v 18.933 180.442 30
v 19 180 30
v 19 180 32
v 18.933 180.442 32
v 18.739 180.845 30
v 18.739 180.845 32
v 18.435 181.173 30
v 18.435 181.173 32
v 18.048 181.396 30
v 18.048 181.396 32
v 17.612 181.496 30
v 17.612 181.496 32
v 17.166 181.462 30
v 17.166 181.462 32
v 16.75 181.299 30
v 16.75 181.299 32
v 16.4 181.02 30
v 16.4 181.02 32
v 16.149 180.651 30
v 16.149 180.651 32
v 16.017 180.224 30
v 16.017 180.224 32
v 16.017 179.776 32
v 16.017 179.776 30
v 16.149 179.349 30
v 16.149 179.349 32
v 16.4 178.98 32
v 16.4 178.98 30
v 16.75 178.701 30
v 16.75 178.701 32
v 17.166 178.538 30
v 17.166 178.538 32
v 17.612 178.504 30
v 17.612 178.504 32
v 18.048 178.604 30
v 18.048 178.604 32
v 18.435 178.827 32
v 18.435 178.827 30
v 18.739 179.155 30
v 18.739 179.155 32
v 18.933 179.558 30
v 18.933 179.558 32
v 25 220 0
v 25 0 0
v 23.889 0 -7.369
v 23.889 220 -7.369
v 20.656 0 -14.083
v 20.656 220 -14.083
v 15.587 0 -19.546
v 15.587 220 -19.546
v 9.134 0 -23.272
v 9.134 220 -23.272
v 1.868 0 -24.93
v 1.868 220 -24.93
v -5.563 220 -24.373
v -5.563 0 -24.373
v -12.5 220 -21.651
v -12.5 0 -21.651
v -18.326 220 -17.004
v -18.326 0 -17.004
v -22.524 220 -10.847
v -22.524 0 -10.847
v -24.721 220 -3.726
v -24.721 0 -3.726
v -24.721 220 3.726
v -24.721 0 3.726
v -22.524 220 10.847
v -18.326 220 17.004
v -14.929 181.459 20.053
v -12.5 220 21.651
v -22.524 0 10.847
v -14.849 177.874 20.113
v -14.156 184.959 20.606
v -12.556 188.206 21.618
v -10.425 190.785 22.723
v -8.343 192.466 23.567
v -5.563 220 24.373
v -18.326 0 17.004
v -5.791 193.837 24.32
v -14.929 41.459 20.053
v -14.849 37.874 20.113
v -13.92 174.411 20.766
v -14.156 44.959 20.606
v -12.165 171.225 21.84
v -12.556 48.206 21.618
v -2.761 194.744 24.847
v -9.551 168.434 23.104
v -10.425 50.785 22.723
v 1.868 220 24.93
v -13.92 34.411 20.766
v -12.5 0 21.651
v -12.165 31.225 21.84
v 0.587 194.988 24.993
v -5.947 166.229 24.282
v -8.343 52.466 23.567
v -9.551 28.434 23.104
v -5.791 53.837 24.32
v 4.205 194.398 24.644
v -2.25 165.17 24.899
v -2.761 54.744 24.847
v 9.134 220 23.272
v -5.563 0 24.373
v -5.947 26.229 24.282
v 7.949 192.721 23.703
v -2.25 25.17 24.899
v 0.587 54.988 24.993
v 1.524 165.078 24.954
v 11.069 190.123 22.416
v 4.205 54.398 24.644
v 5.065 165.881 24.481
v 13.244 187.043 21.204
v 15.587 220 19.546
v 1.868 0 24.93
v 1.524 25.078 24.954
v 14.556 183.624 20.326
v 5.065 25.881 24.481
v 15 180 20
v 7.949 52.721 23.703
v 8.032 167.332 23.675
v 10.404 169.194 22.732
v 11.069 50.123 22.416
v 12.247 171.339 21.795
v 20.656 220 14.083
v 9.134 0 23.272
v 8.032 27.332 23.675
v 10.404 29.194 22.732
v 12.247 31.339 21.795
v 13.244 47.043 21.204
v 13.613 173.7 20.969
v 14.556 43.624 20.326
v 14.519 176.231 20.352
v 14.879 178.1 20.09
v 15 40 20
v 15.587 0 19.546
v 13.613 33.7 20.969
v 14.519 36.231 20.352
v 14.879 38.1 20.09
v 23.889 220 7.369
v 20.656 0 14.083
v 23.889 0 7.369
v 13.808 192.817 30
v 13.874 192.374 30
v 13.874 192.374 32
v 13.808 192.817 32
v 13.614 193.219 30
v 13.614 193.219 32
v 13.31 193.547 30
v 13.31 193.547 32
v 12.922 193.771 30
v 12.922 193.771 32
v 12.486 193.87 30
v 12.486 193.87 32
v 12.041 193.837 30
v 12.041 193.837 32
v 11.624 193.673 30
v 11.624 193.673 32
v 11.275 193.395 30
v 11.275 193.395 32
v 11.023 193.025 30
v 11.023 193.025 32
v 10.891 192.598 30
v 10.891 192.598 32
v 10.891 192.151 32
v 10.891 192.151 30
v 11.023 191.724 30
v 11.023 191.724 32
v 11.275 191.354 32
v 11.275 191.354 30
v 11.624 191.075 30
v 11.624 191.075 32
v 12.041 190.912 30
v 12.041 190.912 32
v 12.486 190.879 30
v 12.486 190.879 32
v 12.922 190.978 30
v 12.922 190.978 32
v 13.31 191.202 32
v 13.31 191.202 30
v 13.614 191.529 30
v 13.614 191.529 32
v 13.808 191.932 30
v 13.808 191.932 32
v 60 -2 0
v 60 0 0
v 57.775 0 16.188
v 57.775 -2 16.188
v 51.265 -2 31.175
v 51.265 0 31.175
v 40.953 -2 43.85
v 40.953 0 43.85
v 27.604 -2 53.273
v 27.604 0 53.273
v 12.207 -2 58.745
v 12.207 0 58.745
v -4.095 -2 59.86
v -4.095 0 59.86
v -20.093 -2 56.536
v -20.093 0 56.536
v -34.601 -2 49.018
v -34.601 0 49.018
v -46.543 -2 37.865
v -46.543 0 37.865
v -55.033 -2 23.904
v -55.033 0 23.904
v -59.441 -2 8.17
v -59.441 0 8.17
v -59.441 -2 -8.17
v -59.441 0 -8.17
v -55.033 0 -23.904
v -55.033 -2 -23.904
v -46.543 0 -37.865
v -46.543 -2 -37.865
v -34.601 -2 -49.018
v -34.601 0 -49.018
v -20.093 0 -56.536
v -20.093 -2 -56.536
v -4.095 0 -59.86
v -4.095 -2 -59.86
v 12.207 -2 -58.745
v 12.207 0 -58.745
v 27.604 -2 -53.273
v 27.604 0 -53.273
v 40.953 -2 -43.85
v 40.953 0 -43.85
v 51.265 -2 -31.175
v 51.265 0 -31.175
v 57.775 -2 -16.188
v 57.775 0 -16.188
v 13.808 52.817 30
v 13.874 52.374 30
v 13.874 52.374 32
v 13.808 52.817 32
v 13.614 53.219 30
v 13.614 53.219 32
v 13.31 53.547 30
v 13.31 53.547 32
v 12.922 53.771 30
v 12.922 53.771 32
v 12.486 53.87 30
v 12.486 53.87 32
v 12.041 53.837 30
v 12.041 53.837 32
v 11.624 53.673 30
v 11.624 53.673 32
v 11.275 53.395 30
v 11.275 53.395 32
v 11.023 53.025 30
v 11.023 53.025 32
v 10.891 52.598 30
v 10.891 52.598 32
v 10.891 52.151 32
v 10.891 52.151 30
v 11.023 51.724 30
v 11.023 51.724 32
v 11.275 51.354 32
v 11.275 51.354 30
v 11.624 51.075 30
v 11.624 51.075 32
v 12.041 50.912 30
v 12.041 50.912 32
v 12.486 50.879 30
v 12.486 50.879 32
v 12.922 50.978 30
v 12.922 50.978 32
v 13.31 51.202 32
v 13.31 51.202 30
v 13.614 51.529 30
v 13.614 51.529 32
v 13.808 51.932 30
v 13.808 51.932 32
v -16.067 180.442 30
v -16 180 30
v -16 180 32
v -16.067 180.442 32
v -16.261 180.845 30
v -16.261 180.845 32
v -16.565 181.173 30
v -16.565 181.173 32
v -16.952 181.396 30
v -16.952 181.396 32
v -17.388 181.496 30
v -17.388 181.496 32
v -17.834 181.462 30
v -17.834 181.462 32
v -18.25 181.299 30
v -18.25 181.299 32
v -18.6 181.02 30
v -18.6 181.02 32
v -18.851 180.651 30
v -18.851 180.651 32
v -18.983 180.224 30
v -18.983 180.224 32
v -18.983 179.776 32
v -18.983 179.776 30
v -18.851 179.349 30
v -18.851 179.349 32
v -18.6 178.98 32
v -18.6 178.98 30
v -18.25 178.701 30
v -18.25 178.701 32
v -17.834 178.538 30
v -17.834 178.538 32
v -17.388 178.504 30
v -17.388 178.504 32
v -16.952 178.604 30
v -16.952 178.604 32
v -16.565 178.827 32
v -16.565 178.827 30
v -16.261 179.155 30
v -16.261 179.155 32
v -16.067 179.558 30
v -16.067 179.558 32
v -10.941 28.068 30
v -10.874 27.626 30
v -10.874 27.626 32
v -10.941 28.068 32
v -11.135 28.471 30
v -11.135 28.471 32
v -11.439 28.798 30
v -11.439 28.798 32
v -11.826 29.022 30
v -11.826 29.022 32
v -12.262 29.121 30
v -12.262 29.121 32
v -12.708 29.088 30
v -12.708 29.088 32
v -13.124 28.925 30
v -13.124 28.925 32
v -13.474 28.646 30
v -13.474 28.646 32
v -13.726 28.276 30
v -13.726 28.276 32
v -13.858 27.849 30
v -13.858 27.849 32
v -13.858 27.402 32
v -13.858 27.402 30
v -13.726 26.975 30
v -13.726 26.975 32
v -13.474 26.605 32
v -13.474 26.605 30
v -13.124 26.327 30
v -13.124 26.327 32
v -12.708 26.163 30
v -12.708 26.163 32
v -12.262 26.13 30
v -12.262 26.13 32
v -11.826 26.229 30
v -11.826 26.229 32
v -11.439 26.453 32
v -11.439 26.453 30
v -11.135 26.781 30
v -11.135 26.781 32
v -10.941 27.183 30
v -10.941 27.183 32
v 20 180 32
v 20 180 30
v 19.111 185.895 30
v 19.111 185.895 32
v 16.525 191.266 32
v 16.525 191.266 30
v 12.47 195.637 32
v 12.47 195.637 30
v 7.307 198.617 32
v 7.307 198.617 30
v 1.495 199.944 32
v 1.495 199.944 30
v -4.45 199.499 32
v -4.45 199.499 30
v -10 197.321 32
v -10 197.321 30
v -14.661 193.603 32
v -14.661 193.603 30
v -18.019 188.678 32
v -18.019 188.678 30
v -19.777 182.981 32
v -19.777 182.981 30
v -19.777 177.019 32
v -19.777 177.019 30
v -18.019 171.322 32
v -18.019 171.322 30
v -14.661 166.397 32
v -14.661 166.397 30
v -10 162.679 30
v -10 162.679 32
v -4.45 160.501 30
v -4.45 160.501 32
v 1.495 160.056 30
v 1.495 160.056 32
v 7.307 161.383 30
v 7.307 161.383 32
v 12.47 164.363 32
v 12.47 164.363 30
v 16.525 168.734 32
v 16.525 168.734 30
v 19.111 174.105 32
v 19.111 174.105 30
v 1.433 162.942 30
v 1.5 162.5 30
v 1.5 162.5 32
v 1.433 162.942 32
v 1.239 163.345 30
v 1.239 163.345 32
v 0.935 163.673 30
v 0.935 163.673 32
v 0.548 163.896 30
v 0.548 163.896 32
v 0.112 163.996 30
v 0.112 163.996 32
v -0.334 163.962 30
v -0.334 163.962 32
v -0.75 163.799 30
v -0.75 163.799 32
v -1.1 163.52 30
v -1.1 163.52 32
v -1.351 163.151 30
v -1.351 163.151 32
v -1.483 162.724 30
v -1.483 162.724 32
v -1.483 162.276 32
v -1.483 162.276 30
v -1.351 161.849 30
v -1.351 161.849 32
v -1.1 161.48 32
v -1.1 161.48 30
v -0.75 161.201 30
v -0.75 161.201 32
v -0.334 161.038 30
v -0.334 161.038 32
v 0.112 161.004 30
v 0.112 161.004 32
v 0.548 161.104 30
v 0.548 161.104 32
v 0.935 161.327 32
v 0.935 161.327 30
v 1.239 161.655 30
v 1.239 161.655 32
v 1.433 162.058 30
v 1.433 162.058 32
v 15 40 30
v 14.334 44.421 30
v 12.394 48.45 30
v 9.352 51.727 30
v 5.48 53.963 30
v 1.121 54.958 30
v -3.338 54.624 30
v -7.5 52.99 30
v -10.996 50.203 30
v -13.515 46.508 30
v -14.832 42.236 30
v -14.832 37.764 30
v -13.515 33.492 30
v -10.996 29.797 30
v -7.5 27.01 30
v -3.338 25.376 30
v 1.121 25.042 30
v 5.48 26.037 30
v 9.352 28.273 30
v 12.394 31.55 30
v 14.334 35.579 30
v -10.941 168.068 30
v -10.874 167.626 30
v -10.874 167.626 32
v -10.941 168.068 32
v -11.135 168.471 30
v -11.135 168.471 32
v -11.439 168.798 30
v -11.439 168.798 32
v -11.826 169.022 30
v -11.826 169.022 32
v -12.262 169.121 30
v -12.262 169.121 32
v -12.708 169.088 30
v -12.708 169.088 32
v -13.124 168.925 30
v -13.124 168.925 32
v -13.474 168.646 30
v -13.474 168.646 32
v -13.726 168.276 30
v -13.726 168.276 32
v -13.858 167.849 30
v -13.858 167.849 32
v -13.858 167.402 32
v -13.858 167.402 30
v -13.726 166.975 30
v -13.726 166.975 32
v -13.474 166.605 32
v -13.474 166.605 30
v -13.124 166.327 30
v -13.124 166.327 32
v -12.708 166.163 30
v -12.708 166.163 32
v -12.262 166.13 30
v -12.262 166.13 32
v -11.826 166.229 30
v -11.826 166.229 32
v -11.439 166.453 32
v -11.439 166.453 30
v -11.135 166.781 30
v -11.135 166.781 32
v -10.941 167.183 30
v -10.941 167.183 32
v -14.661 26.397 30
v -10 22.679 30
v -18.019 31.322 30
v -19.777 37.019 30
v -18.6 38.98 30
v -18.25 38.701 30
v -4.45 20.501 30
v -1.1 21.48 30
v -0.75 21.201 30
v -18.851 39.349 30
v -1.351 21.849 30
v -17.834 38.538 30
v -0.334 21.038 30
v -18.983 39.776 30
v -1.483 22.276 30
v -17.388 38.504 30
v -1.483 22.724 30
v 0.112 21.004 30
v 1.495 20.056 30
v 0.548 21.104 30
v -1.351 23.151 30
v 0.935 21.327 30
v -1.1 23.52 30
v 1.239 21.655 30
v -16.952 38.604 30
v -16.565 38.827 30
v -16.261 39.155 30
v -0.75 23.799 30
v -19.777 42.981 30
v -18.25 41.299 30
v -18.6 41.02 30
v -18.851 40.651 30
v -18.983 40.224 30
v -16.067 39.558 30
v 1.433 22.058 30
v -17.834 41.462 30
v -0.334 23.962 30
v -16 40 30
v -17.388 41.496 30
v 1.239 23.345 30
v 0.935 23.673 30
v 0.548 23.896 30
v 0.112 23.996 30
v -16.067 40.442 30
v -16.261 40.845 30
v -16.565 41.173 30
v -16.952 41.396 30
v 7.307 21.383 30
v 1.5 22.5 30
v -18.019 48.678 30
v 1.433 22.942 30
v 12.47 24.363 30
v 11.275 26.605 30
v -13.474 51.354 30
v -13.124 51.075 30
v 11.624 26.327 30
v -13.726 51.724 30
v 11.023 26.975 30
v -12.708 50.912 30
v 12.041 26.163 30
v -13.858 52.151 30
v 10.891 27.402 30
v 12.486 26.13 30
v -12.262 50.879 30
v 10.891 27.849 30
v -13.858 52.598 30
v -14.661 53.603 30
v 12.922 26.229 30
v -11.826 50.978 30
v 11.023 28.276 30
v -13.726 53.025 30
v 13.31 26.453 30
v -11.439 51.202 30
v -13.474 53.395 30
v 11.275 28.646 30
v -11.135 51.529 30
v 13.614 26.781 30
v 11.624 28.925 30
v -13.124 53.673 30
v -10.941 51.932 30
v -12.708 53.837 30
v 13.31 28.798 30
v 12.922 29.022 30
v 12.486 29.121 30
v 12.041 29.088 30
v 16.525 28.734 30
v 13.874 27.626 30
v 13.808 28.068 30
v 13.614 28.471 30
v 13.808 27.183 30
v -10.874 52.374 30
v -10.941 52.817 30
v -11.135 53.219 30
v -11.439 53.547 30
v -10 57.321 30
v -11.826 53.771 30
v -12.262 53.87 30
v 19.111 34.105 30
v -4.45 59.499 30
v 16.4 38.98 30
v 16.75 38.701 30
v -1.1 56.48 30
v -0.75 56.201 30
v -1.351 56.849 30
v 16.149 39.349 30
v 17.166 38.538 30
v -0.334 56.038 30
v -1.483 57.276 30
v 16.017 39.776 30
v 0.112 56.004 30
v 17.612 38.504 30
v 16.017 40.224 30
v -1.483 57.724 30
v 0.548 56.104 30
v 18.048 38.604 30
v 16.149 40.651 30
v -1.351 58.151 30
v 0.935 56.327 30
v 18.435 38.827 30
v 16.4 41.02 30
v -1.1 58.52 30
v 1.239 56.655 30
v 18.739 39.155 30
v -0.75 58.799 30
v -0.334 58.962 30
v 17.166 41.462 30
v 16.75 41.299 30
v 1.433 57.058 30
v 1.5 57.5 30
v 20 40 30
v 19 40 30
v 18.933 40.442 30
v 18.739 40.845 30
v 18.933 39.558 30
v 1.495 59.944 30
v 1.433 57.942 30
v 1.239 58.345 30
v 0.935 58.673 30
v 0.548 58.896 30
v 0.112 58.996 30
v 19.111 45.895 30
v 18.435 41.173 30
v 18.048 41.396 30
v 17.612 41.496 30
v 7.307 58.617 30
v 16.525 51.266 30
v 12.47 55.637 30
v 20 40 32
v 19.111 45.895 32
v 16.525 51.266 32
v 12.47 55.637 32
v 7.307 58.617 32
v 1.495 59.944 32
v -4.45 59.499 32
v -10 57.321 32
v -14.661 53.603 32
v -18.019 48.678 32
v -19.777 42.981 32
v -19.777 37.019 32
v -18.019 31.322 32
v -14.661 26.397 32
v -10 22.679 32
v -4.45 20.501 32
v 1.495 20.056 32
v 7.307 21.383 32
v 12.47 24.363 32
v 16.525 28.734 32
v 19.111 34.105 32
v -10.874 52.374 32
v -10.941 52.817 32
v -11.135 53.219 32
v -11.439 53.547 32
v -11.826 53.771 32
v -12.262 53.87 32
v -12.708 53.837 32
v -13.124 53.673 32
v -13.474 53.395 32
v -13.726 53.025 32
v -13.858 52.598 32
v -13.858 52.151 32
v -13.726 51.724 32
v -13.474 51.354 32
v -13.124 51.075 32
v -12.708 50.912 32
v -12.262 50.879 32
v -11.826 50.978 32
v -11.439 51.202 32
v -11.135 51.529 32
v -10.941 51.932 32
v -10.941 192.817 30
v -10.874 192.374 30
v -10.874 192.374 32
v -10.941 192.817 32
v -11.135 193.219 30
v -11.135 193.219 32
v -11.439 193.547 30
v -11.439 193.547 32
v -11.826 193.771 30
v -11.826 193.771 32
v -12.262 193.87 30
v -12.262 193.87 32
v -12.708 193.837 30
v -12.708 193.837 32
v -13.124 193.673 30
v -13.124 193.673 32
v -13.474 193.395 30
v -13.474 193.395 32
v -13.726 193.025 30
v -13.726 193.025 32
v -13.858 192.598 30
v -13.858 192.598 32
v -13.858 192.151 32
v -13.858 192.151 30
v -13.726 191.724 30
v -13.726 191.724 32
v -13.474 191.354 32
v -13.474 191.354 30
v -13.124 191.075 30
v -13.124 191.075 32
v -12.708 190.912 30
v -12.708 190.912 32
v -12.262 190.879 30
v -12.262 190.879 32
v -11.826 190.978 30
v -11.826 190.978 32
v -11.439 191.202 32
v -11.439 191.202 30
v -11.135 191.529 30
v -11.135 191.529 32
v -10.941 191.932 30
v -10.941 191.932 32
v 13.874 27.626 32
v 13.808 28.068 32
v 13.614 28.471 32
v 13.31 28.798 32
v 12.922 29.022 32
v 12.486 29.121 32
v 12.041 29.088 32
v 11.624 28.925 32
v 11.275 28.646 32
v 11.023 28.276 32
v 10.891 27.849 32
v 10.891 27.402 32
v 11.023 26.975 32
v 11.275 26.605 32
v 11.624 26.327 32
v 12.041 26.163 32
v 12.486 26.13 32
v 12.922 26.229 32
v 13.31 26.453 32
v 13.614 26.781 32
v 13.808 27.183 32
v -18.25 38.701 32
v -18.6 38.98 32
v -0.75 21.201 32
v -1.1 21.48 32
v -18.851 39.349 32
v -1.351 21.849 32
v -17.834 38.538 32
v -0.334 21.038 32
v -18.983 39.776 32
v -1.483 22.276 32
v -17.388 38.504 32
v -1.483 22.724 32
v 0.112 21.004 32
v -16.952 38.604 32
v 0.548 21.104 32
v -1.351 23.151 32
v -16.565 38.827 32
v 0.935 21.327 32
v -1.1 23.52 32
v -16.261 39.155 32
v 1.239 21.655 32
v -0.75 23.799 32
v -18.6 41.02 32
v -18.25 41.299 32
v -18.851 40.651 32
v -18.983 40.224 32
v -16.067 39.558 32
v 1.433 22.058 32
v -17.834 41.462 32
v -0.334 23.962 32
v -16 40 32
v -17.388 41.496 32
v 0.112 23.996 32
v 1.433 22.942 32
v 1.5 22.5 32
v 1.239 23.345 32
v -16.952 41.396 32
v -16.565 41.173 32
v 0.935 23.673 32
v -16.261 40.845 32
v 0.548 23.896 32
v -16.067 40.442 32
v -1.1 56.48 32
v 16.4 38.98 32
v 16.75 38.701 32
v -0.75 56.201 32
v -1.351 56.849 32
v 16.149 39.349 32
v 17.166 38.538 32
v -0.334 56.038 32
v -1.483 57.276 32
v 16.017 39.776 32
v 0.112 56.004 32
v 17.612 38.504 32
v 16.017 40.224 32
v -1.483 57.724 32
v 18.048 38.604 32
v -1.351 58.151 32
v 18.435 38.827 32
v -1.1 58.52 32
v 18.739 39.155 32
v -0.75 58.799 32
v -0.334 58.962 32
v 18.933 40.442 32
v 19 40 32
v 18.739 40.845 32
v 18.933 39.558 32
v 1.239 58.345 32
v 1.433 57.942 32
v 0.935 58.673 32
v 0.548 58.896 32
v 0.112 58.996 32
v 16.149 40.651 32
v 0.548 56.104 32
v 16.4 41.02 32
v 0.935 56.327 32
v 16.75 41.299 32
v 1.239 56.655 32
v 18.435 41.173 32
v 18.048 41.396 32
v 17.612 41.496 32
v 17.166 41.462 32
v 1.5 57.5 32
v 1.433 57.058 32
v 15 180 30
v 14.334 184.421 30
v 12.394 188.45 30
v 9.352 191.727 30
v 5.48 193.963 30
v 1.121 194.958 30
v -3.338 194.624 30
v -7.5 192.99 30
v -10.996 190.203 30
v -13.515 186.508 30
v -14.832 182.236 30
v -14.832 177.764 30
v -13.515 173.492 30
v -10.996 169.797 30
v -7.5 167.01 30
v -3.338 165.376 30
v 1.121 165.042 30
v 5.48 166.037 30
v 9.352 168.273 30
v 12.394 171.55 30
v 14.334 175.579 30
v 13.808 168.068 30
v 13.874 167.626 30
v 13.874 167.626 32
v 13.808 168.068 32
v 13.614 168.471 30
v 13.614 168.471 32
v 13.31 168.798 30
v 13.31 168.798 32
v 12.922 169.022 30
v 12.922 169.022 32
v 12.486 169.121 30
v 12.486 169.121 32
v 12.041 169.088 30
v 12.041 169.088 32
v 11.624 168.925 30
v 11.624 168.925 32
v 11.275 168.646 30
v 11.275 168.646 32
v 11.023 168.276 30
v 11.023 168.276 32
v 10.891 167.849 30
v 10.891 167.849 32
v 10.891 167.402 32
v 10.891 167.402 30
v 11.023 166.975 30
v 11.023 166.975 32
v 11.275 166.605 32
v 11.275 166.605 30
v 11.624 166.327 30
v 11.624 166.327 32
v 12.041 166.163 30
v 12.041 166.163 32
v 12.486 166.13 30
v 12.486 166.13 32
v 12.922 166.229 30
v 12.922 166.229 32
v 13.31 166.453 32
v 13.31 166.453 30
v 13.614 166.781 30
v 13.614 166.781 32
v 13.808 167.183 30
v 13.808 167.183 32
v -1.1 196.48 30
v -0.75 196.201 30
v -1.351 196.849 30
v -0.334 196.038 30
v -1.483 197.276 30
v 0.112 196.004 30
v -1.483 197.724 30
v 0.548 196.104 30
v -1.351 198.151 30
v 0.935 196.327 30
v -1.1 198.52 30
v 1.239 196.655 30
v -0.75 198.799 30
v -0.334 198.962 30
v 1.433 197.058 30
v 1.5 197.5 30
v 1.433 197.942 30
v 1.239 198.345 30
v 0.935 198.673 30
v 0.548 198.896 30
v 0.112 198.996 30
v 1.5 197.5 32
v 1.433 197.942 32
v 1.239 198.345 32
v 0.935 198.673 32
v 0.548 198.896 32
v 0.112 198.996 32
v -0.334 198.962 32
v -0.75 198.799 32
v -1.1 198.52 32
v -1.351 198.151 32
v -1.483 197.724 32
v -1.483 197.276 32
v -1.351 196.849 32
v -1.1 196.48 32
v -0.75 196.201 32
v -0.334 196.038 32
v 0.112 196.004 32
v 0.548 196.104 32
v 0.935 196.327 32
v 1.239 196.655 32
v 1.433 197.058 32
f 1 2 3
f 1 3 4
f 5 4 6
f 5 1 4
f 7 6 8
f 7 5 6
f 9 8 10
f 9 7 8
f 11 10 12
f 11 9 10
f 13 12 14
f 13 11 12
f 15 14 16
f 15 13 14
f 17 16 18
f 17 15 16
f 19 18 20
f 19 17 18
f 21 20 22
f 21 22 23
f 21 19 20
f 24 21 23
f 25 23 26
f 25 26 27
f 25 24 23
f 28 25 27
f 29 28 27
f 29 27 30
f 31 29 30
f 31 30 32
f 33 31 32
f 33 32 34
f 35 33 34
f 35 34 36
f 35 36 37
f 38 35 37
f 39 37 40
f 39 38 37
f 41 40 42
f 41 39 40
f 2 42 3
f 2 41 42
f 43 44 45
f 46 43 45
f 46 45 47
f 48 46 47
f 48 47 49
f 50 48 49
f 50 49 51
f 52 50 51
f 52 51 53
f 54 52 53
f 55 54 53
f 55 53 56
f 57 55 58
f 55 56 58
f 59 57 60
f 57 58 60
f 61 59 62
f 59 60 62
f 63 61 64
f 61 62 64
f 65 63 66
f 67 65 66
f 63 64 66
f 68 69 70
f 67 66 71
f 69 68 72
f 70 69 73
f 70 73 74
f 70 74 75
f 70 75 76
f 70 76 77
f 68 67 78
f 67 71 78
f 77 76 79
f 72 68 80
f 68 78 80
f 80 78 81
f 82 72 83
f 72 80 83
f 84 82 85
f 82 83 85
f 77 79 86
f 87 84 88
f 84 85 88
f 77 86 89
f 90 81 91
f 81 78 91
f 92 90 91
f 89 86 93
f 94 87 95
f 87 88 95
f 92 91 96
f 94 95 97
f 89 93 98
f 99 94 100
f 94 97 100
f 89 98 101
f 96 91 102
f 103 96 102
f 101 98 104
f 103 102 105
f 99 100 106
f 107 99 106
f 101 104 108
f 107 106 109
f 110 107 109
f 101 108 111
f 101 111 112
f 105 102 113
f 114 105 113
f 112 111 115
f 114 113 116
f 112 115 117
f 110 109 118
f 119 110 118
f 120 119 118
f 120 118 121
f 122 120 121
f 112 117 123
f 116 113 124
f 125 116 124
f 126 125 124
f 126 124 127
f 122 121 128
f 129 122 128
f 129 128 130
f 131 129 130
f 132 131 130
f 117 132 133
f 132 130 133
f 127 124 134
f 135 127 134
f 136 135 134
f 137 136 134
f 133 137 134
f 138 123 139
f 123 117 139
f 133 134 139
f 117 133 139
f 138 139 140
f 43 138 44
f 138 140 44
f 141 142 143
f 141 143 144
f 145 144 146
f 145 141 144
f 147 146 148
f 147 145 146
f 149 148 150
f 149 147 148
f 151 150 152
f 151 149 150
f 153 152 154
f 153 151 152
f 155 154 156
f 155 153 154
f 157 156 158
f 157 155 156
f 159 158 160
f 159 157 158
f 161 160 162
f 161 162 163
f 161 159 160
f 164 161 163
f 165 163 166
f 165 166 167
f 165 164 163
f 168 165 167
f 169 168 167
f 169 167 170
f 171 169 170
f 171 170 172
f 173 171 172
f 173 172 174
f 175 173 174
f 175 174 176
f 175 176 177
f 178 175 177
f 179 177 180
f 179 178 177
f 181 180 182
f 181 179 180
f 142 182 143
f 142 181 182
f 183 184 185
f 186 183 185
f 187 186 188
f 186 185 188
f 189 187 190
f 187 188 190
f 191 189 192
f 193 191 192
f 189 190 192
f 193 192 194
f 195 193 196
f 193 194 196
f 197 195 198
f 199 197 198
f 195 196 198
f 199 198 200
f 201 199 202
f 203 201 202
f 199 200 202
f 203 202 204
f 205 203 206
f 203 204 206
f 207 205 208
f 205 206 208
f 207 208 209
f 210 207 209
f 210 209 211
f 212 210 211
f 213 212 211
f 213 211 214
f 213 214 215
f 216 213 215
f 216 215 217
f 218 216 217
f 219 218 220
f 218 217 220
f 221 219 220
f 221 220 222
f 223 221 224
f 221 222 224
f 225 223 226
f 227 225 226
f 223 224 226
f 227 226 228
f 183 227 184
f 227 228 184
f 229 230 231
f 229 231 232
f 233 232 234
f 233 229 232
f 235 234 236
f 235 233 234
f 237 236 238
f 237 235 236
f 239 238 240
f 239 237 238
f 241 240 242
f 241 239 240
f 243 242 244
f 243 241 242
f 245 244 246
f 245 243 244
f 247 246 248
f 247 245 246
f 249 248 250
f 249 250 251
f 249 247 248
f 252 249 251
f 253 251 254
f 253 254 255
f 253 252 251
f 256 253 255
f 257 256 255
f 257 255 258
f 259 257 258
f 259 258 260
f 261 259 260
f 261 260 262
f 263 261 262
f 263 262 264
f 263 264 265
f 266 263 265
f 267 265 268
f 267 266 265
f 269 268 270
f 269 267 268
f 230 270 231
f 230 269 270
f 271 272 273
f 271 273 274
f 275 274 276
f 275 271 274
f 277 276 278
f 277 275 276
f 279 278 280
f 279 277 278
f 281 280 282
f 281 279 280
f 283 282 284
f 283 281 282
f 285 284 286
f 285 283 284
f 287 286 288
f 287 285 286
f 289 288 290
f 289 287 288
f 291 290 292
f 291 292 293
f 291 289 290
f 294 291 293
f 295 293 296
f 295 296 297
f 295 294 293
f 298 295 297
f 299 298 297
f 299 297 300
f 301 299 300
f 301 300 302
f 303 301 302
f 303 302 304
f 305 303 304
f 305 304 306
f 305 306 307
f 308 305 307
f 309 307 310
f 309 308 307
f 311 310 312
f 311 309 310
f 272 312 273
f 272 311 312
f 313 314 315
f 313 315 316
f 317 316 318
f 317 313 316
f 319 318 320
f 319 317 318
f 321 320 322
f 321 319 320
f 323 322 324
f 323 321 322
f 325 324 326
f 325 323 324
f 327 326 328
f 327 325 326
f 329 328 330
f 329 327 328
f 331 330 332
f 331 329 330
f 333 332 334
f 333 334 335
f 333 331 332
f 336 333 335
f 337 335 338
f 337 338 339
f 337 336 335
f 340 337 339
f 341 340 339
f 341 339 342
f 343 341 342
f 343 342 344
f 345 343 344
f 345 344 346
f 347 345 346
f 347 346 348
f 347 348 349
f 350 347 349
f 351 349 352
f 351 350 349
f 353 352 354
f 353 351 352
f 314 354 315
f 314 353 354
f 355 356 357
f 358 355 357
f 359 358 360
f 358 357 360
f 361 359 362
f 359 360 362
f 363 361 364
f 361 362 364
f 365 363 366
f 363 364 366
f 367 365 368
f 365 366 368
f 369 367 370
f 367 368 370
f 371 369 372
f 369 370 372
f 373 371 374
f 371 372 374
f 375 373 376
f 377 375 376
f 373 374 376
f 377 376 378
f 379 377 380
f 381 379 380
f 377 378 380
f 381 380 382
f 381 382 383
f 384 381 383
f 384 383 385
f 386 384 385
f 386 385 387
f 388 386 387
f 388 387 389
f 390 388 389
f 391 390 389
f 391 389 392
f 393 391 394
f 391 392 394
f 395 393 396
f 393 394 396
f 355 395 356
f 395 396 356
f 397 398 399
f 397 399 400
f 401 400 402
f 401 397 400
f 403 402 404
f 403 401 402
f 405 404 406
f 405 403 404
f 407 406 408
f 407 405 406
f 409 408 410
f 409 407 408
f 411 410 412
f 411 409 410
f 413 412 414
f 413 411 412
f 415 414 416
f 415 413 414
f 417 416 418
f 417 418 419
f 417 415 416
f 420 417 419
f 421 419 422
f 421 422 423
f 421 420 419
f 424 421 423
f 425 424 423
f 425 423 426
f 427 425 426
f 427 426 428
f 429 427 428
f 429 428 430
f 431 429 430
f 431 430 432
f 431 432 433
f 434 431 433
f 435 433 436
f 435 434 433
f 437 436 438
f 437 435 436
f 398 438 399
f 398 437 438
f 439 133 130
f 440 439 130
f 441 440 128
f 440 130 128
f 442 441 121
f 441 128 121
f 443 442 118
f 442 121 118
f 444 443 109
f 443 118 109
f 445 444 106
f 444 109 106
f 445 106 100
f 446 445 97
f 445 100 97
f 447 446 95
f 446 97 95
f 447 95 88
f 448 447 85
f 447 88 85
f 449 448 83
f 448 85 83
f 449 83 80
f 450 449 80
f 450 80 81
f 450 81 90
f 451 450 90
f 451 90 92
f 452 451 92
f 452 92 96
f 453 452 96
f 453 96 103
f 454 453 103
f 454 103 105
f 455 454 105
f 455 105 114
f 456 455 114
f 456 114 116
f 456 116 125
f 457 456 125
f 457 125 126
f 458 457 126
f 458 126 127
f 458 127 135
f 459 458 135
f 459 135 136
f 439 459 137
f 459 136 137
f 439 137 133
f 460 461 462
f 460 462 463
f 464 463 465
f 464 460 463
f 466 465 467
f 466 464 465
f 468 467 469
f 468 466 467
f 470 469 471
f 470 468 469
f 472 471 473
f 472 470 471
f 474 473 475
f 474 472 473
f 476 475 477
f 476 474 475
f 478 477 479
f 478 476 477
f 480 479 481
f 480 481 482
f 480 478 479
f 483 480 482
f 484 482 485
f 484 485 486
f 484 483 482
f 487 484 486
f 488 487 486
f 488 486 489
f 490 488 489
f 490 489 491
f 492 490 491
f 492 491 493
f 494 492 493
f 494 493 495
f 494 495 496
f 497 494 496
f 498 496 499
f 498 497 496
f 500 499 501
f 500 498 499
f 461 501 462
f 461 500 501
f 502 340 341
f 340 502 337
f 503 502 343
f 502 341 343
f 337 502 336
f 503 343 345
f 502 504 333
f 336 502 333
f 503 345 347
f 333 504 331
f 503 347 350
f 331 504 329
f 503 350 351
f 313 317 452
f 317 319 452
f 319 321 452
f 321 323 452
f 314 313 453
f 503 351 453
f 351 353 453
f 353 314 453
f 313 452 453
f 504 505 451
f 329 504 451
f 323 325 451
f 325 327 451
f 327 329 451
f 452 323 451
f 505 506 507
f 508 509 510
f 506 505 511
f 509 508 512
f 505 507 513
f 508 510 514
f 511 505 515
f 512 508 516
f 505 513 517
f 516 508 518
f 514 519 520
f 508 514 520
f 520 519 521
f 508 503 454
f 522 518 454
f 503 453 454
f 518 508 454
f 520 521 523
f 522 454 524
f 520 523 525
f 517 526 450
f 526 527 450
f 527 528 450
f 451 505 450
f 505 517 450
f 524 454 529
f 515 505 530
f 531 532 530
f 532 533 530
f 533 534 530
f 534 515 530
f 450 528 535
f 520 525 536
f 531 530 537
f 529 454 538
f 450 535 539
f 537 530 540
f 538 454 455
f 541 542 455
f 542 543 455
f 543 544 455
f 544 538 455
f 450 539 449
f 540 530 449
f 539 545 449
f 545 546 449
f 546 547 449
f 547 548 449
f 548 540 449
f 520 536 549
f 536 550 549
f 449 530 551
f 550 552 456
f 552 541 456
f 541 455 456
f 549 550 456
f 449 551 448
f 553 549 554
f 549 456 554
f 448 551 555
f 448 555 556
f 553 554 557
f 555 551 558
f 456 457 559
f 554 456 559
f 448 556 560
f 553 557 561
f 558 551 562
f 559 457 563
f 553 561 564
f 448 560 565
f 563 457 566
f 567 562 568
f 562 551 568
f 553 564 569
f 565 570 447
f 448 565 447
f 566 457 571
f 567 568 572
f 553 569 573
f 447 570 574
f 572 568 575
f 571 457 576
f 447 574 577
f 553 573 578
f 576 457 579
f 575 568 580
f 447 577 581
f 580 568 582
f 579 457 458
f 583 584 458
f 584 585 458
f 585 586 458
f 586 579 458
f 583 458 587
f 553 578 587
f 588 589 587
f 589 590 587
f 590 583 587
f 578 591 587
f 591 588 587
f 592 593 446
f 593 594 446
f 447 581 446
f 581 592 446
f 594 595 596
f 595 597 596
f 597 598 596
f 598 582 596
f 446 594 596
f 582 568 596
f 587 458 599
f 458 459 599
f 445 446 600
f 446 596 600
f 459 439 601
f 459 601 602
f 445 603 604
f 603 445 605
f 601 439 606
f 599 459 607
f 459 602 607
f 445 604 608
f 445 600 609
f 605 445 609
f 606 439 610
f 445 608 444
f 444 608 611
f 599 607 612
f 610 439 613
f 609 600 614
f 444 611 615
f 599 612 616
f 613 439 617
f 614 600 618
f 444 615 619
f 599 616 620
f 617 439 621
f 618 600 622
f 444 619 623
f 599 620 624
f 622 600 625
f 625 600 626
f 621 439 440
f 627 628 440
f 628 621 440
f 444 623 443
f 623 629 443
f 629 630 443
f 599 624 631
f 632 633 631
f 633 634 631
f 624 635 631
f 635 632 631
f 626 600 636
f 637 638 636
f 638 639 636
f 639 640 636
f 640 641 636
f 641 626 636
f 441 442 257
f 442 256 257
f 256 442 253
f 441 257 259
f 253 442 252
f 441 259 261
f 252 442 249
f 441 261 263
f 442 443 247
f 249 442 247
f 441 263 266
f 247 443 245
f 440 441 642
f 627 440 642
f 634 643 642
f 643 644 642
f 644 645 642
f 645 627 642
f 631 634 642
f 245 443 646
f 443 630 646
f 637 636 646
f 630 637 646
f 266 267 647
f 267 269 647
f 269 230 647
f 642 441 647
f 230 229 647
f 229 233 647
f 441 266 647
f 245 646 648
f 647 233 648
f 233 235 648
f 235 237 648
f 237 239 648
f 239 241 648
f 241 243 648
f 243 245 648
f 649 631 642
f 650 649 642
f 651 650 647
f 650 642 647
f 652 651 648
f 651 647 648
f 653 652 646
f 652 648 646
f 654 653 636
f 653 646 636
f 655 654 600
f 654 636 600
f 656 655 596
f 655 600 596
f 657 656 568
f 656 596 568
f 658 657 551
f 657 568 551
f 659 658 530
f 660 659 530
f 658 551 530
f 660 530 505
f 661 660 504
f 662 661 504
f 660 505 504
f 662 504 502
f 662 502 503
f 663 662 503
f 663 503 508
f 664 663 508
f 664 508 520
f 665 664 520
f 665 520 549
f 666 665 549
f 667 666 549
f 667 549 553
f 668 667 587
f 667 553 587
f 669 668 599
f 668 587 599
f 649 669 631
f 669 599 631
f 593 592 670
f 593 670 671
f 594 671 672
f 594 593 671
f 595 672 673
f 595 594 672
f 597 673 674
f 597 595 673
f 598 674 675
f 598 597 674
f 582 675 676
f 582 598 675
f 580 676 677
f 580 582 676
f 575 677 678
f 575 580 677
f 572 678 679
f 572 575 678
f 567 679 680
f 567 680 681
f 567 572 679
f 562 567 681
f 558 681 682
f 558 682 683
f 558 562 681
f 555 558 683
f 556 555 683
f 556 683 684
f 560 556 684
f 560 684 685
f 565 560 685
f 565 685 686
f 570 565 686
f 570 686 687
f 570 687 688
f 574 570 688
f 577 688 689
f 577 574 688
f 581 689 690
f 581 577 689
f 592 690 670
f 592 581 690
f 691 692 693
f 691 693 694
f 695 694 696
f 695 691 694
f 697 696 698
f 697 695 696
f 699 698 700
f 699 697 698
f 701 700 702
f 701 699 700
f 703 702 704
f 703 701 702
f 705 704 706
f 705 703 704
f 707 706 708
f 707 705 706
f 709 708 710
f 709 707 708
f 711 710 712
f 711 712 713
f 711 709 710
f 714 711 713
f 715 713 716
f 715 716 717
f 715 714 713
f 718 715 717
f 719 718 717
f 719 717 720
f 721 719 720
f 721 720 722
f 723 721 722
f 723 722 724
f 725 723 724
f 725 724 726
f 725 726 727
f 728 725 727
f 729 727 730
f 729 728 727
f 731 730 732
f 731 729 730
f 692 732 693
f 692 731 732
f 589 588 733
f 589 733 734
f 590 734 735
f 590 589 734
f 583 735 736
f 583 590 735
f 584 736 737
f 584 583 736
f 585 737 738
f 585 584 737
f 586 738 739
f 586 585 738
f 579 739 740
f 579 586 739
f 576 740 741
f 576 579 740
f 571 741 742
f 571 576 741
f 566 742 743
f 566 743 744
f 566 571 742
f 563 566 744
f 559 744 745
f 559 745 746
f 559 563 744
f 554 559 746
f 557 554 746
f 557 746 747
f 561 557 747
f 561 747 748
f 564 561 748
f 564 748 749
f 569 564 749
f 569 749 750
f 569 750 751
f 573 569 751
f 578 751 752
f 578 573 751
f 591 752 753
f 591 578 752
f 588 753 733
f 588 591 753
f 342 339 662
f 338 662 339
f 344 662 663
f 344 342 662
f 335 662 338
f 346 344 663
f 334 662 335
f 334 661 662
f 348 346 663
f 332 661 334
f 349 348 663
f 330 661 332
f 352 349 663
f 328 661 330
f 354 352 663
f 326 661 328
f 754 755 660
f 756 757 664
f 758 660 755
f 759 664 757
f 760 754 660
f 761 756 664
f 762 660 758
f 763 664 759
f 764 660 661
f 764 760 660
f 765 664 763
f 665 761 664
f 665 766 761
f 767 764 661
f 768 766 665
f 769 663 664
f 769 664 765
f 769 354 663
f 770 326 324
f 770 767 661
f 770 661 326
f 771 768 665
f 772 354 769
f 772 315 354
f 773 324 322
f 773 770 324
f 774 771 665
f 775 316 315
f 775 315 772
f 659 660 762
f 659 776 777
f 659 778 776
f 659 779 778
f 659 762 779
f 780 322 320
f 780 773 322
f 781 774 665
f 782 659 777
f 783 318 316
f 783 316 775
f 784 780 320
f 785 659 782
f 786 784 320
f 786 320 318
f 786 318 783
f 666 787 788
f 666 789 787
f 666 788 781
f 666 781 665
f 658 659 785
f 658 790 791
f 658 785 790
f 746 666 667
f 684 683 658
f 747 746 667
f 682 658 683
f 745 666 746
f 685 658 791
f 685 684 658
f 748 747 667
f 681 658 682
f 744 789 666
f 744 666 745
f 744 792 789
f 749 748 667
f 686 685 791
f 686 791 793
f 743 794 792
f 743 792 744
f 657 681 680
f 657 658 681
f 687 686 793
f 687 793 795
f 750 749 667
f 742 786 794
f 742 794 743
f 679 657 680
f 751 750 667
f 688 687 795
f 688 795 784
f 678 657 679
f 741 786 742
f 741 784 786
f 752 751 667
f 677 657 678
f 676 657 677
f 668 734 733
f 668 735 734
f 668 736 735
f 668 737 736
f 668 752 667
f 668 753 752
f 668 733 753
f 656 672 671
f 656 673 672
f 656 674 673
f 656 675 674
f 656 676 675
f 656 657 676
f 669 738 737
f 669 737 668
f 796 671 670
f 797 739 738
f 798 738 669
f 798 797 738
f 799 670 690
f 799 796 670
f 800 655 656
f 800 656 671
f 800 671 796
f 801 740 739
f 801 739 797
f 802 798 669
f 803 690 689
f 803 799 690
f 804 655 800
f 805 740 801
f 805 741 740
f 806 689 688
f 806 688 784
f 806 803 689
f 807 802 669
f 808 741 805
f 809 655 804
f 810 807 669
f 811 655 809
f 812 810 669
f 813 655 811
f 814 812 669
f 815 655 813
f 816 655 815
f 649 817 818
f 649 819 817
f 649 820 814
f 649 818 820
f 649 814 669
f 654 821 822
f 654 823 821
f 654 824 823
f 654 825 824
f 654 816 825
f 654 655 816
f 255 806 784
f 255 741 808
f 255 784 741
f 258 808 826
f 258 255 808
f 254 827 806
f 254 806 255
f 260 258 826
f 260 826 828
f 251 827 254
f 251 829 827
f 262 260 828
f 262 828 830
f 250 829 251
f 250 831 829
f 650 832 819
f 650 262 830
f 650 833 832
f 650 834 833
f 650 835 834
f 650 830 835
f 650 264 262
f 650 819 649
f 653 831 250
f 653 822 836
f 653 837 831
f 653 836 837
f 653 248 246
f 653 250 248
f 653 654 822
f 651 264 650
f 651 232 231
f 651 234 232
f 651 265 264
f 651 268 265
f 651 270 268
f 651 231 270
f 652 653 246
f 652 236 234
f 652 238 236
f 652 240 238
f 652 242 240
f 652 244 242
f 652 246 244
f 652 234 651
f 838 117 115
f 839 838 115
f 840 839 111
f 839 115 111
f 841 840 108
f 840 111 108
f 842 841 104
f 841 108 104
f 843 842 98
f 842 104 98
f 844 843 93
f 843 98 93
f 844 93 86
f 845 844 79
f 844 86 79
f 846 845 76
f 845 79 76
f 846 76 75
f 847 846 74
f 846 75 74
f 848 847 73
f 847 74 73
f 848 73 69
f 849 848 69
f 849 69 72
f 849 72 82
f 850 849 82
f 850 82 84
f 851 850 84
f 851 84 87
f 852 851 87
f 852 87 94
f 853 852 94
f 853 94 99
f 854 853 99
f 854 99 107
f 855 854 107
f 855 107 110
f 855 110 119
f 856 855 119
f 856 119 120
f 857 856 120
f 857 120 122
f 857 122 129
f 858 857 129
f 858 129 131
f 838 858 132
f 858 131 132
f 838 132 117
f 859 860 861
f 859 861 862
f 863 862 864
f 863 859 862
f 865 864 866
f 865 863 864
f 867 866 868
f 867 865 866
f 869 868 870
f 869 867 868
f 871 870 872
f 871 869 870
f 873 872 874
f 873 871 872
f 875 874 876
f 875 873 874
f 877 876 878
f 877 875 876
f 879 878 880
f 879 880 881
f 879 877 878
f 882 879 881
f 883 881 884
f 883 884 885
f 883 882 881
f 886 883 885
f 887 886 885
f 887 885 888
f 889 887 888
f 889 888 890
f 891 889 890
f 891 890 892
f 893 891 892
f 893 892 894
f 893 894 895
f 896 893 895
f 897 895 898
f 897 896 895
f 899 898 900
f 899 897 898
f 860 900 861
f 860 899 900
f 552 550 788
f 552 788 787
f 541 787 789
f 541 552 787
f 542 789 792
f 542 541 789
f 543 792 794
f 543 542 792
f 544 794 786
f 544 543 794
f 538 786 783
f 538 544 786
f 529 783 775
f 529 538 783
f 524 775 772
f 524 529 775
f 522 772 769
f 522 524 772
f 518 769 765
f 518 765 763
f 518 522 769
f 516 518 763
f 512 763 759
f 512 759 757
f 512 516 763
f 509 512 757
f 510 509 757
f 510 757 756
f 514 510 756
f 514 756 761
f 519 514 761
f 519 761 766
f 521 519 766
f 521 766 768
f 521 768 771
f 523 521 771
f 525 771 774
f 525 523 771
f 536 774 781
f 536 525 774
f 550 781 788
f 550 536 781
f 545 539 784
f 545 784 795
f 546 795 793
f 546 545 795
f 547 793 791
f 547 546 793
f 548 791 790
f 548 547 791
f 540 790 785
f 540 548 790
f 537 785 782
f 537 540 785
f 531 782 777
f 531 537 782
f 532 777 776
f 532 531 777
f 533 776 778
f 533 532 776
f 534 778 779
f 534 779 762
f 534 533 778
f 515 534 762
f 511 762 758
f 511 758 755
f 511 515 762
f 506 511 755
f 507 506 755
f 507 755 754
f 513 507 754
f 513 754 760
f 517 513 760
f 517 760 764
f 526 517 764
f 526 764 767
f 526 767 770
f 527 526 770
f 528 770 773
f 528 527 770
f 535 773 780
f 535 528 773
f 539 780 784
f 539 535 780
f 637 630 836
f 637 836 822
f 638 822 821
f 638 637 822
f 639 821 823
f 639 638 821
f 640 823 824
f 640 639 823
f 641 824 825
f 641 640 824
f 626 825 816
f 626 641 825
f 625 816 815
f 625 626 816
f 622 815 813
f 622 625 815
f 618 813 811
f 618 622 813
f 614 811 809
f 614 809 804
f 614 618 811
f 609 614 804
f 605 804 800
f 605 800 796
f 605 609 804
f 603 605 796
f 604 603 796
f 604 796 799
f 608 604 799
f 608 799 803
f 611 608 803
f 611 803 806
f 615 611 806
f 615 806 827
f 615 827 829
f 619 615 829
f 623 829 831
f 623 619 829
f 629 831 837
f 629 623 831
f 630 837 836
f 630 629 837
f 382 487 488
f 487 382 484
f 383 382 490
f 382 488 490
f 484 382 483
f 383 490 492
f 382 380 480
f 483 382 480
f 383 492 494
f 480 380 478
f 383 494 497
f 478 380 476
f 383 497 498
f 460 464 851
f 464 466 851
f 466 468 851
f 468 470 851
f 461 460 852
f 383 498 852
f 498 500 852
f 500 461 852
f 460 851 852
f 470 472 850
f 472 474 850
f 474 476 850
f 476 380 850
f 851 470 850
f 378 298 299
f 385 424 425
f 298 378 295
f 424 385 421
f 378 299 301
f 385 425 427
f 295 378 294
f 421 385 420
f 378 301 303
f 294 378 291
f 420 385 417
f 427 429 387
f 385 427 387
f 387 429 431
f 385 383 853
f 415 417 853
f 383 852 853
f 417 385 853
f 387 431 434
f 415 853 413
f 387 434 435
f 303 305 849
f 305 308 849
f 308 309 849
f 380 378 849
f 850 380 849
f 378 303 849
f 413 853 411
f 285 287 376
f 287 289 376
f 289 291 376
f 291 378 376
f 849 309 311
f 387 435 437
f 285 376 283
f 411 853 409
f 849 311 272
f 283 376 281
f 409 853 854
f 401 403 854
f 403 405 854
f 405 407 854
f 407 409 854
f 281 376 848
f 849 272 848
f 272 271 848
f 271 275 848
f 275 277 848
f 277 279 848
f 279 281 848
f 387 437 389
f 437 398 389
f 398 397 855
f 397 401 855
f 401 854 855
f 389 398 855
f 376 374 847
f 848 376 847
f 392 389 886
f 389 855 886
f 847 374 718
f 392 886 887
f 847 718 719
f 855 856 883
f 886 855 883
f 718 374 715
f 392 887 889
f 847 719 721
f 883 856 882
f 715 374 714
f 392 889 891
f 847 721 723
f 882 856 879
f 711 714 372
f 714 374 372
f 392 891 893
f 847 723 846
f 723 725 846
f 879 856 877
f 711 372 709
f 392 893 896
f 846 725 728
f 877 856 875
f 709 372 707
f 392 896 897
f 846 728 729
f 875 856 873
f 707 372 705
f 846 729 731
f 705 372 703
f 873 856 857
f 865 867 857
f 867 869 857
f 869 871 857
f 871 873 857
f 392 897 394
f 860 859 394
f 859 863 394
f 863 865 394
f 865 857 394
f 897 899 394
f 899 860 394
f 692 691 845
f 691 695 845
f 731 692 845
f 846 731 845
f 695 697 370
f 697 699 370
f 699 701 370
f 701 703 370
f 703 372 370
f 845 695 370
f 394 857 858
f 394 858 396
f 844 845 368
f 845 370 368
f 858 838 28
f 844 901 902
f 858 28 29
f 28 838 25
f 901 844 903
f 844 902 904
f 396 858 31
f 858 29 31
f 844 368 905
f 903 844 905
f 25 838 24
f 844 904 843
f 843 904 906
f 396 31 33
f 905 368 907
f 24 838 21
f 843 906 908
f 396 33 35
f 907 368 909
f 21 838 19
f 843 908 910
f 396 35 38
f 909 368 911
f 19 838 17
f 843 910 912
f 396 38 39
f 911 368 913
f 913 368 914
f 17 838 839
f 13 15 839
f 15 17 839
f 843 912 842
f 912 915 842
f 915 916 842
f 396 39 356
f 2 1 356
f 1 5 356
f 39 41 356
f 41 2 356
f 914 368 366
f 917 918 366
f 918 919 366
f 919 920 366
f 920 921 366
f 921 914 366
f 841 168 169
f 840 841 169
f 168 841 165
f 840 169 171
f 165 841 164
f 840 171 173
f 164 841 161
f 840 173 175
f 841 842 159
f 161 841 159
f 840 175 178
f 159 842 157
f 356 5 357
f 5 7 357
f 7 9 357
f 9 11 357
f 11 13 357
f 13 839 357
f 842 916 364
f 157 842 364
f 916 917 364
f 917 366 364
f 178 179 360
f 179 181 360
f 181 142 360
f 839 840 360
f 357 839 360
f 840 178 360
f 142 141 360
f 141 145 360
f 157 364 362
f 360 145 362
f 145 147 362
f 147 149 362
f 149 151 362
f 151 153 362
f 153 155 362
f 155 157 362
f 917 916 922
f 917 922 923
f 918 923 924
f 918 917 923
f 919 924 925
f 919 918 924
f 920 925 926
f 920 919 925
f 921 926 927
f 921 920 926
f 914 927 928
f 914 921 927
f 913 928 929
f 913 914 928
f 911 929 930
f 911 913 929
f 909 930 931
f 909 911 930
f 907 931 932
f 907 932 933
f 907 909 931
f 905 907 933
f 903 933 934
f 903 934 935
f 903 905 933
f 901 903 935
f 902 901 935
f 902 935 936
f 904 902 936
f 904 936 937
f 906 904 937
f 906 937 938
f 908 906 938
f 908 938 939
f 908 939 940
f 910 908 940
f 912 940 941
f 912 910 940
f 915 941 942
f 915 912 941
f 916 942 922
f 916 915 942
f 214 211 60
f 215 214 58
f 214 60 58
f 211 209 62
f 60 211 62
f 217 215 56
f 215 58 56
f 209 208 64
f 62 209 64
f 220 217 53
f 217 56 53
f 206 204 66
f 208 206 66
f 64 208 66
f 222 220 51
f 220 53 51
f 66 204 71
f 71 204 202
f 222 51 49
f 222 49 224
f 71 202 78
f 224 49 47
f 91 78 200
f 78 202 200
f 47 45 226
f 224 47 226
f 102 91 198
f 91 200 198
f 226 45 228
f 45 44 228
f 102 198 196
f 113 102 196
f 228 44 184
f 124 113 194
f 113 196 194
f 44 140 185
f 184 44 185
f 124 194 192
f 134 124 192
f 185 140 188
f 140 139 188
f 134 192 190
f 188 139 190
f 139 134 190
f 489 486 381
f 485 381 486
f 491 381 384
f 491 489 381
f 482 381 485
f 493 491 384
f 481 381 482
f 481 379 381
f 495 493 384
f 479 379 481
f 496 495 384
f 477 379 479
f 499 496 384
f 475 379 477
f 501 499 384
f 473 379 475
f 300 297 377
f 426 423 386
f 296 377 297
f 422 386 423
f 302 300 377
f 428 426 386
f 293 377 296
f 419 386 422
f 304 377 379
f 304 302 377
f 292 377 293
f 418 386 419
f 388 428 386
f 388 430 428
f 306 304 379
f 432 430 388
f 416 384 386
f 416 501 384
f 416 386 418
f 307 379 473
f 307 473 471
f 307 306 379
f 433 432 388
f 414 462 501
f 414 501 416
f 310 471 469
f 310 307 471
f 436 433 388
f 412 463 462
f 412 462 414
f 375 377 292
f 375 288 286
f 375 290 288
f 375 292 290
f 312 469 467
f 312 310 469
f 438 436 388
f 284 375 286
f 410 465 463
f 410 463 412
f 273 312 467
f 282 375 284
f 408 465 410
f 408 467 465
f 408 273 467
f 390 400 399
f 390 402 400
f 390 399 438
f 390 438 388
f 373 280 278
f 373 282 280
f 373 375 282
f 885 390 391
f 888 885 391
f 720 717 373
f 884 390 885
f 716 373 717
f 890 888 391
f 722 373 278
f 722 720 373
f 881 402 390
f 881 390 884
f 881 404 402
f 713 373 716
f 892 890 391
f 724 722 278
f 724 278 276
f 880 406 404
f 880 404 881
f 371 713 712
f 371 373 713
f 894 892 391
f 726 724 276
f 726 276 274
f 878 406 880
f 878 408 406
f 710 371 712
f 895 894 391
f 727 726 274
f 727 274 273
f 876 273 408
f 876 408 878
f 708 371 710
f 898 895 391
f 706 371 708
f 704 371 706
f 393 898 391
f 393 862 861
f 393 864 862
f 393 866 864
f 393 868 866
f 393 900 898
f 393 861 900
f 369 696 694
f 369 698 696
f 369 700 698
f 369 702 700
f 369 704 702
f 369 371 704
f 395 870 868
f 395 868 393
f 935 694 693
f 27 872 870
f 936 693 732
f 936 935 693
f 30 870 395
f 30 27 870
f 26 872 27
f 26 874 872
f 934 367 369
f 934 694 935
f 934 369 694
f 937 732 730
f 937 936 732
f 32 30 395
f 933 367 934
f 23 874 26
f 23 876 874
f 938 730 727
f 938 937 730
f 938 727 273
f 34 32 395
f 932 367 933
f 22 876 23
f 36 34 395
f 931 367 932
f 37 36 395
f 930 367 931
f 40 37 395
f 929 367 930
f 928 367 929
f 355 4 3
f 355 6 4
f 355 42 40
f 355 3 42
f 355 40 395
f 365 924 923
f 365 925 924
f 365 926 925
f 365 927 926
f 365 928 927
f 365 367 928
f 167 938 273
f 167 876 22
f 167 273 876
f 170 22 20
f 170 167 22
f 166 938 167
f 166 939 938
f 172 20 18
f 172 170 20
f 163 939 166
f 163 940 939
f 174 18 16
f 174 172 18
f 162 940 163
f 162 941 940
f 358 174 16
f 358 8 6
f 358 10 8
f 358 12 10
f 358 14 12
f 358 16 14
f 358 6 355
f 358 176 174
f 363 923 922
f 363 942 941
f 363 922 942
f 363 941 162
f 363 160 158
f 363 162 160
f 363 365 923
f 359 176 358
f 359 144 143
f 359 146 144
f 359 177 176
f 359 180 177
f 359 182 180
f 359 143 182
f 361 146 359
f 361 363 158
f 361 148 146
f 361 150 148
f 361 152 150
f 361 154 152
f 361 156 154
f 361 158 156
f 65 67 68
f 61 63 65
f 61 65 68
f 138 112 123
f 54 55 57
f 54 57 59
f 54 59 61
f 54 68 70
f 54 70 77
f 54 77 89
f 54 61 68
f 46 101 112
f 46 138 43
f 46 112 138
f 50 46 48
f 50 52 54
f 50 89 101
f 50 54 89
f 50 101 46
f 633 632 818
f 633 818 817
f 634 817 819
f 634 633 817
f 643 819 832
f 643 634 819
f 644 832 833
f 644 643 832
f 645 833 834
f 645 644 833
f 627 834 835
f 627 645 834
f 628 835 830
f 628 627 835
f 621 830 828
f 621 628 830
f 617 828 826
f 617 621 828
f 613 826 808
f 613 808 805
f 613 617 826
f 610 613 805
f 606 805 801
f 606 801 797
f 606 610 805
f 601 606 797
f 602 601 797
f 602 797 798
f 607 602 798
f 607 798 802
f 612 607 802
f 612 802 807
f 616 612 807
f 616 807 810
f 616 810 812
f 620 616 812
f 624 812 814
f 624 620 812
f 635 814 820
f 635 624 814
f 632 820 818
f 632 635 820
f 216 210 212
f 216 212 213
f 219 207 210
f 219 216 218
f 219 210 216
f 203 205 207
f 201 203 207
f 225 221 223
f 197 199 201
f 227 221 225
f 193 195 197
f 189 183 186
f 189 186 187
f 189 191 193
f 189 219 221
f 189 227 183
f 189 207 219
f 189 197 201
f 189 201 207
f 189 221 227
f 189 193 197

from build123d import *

# Parameters (mm, degrees)
SKETCH1_R           = 25
BOSS_EXTRUDE1_DEPTH = 220
SKETCH2_R           = 15
BOSS_EXTRUDE2_DEPTH = 30
SKETCH3_R           = 20
SKETCH3_R_2         = 1.5
BOSS_EXTRUDE4_DEPTH = 2
SKETCH4_R           = 60
BOSS_EXTRUDE5_DEPTH = 2


with BuildPart() as part:
    # Sketch1 → Boss-Extrude1 (new body)
    with BuildSketch(Plane(origin=(0, 0, 0), x_dir=(1, 0, 0), z_dir=(0, 1, 0))):
        Circle(SKETCH1_R)
    extrude(amount=BOSS_EXTRUDE1_DEPTH)

    # Sketch2 → Boss-Extrude2 (add)
    with BuildSketch(Plane.XY):
        with Locations((0, 180)):
            Circle(SKETCH2_R)
        with Locations((0, 40)):
            Circle(SKETCH2_R)
    extrude(amount=BOSS_EXTRUDE2_DEPTH)

    # Sketch3 → Boss-Extrude4 (add)
    with BuildSketch(Plane.XY.offset(30)):
        with Locations((0, 180)):
            Circle(SKETCH3_R)
        with Locations((0, 197.5)):
            Circle(SKETCH3_R_2, mode=Mode.SUBTRACT)
        with Locations((12.374368671, 192.374368671)):
            Circle(SKETCH3_R_2, mode=Mode.SUBTRACT)
        with Locations((17.5, 180)):
            Circle(SKETCH3_R_2, mode=Mode.SUBTRACT)
        with Locations((12.374368671, 167.625631329)):
            Circle(SKETCH3_R_2, mode=Mode.SUBTRACT)
        with Locations((0, 162.5)):
            Circle(SKETCH3_R_2, mode=Mode.SUBTRACT)
        with Locations((-12.374368671, 167.625631329)):
            Circle(SKETCH3_R_2, mode=Mode.SUBTRACT)
        with Locations((-17.5, 180)):
            Circle(SKETCH3_R_2, mode=Mode.SUBTRACT)
        with Locations((-12.374368671, 192.374368671)):
            Circle(SKETCH3_R_2, mode=Mode.SUBTRACT)
        with Locations((0, 40)):
            Circle(SKETCH3_R)
        with Locations((0, 57.5)):
            Circle(SKETCH3_R_2, mode=Mode.SUBTRACT)
        with Locations((12.374368671, 52.374368671)):
            Circle(SKETCH3_R_2, mode=Mode.SUBTRACT)
        with Locations((17.5, 40)):
            Circle(SKETCH3_R_2, mode=Mode.SUBTRACT)
        with Locations((12.374368671, 27.625631329)):
            Circle(SKETCH3_R_2, mode=Mode.SUBTRACT)
        with Locations((0, 22.5)):
            Circle(SKETCH3_R_2, mode=Mode.SUBTRACT)
        with Locations((-12.374368671, 27.625631329)):
            Circle(SKETCH3_R_2, mode=Mode.SUBTRACT)
        with Locations((-17.5, 40)):
            Circle(SKETCH3_R_2, mode=Mode.SUBTRACT)
        with Locations((-12.374368671, 52.374368671)):
            Circle(SKETCH3_R_2, mode=Mode.SUBTRACT)
    extrude(amount=BOSS_EXTRUDE4_DEPTH)

    # Sketch4 → Boss-Extrude5 (add)
    with BuildSketch(Plane.XZ):
        Circle(SKETCH4_R)
    extrude(amount=BOSS_EXTRUDE5_DEPTH)


solid = part.part
